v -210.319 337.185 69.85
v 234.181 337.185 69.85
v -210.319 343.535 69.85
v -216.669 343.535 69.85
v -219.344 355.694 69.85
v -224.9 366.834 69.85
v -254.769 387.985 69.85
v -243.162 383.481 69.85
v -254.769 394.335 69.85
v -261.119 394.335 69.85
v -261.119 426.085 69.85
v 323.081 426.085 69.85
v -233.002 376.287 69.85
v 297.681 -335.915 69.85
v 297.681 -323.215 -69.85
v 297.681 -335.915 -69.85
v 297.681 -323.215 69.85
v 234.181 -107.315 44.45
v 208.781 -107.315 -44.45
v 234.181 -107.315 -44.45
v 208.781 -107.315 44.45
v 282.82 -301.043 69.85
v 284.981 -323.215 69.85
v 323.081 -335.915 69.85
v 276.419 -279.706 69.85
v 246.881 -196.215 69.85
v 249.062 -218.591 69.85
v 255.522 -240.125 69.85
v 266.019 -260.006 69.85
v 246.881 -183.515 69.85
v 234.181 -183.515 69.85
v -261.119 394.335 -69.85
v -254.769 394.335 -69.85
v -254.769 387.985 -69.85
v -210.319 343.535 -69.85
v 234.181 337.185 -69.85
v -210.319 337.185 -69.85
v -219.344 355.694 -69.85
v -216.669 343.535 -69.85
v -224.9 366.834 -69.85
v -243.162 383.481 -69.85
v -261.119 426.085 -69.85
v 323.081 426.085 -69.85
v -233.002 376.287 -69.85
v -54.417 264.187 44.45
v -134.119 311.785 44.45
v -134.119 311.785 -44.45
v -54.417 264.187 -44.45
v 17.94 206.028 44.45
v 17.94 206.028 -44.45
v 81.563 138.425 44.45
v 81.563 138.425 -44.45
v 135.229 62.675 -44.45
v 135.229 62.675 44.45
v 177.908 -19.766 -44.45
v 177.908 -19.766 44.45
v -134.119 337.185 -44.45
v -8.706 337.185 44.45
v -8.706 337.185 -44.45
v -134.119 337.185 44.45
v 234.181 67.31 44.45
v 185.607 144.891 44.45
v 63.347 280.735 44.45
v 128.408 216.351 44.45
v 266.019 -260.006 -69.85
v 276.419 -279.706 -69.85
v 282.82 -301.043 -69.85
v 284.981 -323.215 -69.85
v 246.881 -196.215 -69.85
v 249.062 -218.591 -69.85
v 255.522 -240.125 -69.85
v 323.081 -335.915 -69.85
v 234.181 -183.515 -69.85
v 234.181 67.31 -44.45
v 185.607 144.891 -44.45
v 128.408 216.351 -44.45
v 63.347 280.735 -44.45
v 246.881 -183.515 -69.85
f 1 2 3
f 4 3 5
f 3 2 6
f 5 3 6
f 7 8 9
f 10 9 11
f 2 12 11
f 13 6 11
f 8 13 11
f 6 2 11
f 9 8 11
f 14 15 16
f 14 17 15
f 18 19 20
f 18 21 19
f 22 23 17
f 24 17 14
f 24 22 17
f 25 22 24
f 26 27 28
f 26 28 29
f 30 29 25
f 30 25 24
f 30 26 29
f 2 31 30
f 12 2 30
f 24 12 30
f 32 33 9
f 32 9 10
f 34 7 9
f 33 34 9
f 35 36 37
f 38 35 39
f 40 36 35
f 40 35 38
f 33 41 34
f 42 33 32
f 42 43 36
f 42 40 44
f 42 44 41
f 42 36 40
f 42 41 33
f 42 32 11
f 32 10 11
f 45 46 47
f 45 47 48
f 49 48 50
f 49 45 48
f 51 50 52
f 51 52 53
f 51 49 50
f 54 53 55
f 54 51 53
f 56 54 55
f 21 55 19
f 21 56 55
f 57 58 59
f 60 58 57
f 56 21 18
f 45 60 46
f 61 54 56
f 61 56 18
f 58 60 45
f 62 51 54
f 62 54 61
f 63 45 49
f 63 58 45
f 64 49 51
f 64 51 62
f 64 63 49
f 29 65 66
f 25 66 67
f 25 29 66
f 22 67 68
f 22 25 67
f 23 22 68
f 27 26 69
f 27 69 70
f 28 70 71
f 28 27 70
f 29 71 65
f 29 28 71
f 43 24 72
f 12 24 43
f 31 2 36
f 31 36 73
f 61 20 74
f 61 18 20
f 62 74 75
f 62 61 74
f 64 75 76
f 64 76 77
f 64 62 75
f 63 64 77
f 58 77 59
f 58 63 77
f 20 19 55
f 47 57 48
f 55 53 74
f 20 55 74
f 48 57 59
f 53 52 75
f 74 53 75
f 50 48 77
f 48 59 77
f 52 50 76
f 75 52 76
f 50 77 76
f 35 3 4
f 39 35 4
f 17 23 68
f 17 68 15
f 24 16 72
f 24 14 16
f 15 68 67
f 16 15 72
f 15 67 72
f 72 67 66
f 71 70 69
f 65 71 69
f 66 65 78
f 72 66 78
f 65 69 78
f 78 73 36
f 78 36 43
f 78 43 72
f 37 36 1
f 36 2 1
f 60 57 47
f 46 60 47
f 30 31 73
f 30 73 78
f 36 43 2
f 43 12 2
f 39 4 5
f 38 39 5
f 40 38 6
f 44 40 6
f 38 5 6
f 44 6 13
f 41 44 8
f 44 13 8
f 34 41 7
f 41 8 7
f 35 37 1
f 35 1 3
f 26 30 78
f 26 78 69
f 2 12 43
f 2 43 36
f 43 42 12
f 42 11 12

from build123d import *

# Parameters (mm, degrees)
BOSS_EXTRUDE1_DEPTH = 69.85
BOSS_EXTRUDE2_DEPTH = 44.45
BOSS_EXTRUDE3_DEPTH = 69.85


with BuildPart() as part:
    # Sketch1 → Boss-Extrude1 (new body, symmetric)
    with BuildSketch(Plane.XY):
        with BuildLine():
            Line((-254.768776984, 387.985), (-254.768776984, 394.335))
            Line((-254.768776984, 394.335), (-261.118776984, 394.335))
            Line((-261.118776984, 394.335), (-261.118776984, 426.085))
            Line((-261.118776984, 426.085), (323.081223016, 426.085))
            Line((323.081223016, 426.085), (234.181223016, 337.185))
            Line((234.181223016, 337.185), (-210.318776984, 337.185))
            Line((-210.318776984, 337.185), (-210.318776984, 343.535))
            Line((-210.318776984, 343.535), (-216.668776984, 343.535))
            ThreePointArc((-216.668776984, 343.535), (-228.660423906, 371.810016924), (-254.768776984, 387.985))
        make_face()
    extrude(amount=BOSS_EXTRUDE1_DEPTH, both=True)


with BuildPart() as body_2:
    # Sketch1_3 → Boss-Extrude2 (new body, symmetric)
    with BuildSketch(Plane.XY):
        with BuildLine():
            ThreePointArc((234.181223016, 67.31), (128.407804757, 216.350798568), (-8.706276984, 337.185))
            Line((-8.706276984, 337.185), (-134.118776984, 337.185))
            Line((-134.118776984, 337.185), (-134.118776984, 311.785))
            ThreePointArc((-134.118776984, 311.785), (81.562882665, 138.424539713), (208.781223016, -107.315))
            Line((208.781223016, -107.315), (234.181223016, -107.315))
            Line((234.181223016, -107.315), (234.181223016, 67.31))
        make_face()
    extrude(amount=BOSS_EXTRUDE2_DEPTH, both=True)


with BuildPart() as body_3:
    # Sketch1_4 → Boss-Extrude3 (new body, symmetric)
    with BuildSketch(Plane.XY):
        with BuildLine():
            Line((323.081223016, -335.915), (323.081223016, 426.085))
            Line((323.081223016, 426.085), (234.181223016, 337.185))
            Line((234.181223016, 337.185), (234.181223016, -183.515))
            Line((234.181223016, -183.515), (246.881223016, -183.515))
            Line((246.881223016, -183.515), (246.881223016, -196.215))
            ThreePointArc((246.881223016, -196.215), (251.768629387, -229.515028089), (266.018608337, -260.006284404))
            ThreePointArc((266.018608337, -260.006284404), (280.138450492, -290.219081757), (284.981223016, -323.215))
            Line((284.981223016, -323.215), (297.681223016, -323.215))
            Line((297.681223016, -323.215), (297.681223016, -335.915))
            Line((297.681223016, -335.915), (323.081223016, -335.915))
        make_face()
    extrude(amount=BOSS_EXTRUDE3_DEPTH, both=True)


solid = Compound([part.part, body_2.part, body_3.part])
